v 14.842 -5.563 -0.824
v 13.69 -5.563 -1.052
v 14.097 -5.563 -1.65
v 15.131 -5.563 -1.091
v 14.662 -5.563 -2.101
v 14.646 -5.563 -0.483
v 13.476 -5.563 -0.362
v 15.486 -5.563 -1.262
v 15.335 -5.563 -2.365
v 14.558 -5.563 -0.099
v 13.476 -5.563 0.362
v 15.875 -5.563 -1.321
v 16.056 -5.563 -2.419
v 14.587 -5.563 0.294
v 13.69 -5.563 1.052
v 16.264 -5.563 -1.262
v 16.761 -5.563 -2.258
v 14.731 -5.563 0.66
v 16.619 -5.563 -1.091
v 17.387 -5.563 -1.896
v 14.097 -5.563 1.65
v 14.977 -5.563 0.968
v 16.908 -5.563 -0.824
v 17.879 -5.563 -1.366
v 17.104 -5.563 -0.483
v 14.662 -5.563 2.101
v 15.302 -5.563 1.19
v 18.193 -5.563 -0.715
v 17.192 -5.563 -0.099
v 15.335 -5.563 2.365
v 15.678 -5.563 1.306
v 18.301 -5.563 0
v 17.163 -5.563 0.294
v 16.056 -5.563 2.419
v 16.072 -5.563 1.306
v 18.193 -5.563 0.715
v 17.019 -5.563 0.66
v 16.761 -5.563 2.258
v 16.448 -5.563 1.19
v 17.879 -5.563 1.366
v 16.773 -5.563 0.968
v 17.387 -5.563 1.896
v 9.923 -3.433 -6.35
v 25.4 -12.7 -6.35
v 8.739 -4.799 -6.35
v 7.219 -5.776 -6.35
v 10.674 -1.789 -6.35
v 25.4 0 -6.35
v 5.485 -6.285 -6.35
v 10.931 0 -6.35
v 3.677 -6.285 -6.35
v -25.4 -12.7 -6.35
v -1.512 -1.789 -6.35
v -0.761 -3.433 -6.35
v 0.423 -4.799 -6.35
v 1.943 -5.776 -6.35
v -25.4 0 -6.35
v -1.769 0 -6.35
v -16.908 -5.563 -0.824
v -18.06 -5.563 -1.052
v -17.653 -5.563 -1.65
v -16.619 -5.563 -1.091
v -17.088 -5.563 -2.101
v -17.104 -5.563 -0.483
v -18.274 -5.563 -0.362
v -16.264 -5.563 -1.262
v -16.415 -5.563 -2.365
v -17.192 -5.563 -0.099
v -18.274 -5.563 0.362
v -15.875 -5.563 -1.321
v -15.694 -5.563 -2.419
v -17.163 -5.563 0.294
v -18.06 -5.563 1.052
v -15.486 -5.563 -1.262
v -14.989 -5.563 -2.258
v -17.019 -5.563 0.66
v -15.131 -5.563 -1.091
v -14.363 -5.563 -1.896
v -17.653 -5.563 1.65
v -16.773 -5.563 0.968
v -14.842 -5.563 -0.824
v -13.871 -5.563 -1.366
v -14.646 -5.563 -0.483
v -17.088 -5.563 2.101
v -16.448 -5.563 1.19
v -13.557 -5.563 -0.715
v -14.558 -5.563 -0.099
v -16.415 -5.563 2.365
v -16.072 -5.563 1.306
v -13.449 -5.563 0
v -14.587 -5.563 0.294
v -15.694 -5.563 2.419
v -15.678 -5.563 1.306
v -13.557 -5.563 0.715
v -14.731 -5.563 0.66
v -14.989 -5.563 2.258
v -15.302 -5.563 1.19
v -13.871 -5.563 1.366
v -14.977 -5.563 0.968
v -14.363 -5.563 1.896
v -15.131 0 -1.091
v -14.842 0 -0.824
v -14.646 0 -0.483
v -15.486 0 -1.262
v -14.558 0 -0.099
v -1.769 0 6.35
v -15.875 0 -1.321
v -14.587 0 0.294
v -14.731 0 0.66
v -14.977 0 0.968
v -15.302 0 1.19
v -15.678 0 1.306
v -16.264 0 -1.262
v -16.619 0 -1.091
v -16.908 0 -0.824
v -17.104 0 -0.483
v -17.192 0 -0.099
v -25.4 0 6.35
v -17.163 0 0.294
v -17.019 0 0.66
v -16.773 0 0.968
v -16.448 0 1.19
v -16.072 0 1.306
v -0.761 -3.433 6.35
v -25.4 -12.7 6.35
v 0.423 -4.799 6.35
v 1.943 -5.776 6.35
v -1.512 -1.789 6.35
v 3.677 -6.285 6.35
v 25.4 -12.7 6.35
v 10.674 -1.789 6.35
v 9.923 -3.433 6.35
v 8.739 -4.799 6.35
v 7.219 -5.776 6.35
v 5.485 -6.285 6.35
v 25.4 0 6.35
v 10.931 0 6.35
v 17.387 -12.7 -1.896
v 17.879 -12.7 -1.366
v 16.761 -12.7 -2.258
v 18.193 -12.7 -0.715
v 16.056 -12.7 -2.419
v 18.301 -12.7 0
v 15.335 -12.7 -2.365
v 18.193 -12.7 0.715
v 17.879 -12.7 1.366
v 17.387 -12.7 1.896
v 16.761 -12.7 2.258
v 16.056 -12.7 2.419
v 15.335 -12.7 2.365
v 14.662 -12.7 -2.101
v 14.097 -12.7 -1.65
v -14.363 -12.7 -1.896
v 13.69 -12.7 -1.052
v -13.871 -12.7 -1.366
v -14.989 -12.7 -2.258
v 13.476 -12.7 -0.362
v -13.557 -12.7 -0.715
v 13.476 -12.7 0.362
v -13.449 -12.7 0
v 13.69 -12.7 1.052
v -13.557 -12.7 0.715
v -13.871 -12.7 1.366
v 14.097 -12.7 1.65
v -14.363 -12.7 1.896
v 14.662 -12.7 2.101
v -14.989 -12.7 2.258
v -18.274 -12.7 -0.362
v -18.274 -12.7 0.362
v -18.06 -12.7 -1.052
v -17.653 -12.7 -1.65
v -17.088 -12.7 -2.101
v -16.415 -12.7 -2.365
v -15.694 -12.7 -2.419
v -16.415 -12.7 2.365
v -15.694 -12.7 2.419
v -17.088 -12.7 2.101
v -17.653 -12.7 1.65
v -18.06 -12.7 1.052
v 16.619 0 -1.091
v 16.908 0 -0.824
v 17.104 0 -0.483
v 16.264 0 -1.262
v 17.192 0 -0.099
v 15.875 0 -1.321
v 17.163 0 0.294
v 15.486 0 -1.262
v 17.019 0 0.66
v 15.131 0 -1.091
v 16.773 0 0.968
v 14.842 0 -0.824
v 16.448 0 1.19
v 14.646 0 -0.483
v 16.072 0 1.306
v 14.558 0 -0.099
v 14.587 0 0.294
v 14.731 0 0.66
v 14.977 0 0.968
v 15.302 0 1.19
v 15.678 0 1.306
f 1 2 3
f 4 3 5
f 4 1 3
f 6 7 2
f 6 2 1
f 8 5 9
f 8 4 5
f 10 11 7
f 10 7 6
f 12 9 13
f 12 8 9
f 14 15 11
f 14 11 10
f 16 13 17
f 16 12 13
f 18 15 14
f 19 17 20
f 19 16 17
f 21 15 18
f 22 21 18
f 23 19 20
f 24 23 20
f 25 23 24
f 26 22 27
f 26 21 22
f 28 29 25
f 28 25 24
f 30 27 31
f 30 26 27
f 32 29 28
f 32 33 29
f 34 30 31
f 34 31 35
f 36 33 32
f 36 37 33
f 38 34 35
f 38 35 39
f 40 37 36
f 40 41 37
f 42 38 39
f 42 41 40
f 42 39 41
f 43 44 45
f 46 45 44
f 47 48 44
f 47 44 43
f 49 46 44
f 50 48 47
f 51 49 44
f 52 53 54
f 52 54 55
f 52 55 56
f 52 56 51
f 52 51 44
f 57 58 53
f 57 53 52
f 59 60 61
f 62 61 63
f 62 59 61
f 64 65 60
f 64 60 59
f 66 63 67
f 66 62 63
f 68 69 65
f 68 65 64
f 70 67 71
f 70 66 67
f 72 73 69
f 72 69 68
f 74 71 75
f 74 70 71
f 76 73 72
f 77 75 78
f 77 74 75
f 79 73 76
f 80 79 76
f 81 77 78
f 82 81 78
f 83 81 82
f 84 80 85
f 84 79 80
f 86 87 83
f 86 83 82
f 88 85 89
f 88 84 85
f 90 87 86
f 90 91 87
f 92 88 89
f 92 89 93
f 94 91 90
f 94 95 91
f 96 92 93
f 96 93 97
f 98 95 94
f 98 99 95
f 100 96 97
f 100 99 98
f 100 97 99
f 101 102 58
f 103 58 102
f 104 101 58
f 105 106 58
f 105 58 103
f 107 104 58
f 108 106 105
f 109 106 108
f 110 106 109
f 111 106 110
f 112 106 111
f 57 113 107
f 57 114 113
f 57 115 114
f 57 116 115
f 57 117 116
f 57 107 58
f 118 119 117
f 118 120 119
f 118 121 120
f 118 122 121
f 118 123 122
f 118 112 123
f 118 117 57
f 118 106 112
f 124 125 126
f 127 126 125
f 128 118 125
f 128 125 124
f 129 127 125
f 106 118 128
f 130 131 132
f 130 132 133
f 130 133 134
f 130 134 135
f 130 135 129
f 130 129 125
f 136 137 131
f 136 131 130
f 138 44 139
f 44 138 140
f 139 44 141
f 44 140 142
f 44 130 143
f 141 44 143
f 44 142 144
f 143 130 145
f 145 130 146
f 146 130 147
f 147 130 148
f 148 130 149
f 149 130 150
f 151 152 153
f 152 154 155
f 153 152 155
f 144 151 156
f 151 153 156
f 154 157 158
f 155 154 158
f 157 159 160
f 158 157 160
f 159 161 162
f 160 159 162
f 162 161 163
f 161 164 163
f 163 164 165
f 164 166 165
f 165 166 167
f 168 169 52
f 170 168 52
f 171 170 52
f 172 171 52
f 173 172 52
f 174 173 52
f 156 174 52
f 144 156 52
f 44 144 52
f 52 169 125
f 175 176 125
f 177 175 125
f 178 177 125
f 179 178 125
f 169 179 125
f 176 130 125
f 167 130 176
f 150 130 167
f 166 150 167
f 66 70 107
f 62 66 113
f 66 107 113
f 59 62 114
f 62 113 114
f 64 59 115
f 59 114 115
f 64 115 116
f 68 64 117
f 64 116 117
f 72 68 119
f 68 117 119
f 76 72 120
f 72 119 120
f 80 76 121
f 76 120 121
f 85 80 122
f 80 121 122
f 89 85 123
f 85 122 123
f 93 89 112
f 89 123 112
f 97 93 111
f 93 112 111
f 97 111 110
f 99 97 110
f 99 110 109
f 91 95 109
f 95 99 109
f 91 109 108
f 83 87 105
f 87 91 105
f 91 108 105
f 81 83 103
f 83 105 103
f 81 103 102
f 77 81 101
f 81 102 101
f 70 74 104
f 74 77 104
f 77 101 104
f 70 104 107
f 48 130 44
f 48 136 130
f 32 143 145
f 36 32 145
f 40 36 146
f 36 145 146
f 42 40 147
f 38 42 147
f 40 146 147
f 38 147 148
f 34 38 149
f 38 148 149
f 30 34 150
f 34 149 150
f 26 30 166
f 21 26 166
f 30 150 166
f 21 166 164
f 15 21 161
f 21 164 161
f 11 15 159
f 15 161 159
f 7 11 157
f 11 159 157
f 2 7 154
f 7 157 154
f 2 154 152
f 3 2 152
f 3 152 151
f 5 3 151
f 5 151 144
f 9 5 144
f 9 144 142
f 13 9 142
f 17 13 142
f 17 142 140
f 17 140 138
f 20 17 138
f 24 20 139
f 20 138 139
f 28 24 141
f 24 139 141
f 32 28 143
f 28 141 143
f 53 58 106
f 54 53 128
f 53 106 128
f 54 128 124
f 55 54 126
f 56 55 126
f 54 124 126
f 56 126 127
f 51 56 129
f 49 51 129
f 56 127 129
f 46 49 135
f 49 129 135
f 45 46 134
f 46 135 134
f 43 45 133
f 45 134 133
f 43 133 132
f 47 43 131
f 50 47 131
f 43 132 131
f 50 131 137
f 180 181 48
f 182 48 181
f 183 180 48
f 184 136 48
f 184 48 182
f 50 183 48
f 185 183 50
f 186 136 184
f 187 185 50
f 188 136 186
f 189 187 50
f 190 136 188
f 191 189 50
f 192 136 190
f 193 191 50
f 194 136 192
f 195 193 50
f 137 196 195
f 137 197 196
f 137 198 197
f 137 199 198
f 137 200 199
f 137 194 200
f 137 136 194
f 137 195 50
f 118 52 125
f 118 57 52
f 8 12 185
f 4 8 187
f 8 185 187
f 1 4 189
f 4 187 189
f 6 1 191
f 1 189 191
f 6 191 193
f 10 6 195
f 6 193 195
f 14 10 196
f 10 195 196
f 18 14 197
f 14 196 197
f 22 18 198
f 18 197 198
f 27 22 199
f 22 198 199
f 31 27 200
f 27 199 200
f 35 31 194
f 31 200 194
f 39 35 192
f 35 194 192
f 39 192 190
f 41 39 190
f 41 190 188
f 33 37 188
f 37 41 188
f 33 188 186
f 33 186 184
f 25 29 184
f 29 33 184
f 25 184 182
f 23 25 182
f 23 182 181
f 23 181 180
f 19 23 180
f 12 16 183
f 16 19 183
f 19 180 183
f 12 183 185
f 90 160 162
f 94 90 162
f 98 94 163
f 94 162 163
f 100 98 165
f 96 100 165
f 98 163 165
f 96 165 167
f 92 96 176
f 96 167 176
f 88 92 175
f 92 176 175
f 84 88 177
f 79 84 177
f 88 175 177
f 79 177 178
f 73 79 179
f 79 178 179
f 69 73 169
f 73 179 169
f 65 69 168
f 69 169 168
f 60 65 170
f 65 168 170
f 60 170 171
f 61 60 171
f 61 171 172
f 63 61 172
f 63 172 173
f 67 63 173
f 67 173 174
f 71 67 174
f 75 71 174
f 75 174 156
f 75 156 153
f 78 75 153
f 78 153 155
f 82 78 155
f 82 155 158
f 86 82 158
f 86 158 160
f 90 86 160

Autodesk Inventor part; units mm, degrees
ref_plane "YZ Plane" through (0, 0, 0) normal (1, 0, 0) x (0, 1, 0)
ref_plane "XZ Plane" through (0, 0, 0) normal (0, 1, 0) x (-1, 0, 0)
ref_plane "XY Plane" through (0, 0, 0) normal (0, 0, 1) x (1, 0, 0)
sketch "Sketch1" plane through (0, 0, 0) normal (0, 1, 0) x (-1, 0, 0)
  line L0 (25.4, 6.35) -> (-25.4, 6.35)
  line L1 (-25.4, 6.35) -> (-25.4, -6.35)
  line L2 (-25.4, -6.35) -> (25.4, -6.35)
  line L3 (25.4, -6.35) -> (25.4, 6.35)
  line L4 (25.4, 6.35) -> (-25.4, -6.35) construction
  line L5 (-25.4, 6.35) -> (25.4, -6.35) construction
  point P0 (0, 0)
  dimension "d0" = 50.8
  dimension "d1" = 12.7
extrude "Extrusion1" add sketch "Sketch1" against normal blind 12.7
sketch "Sketch3" plane through (-25.4, 0, 6.35) normal (0, 0, 1) x (1, 0, 0)
  line L0 (0, 0) -> (50.8, 0) projected
  line L1 (0, 0) -> (0, -12.7) projected
  line L2 (50.8, -12.7) -> (0, -12.7) projected
  line L3 (50.8, 0) -> (50.8, -12.7) projected
  circle A0 centre (29.981, 0) radius 6.35 projected
  point P0 (25.4, 0)
extrude "Extrusion2" cut sketch "Sketch3" against normal through all contours A0 L0 | L0 A0
sketch "Sketch4" plane through (0, -12.7, 0) normal (0, -1, 0) x (1, 0, 0)
  line L0 (-25.4, 6.35) -> (-25.4, -6.35) construction
  line L1 (-25.4, 0) -> (25.4, 0) construction
  line L2 (25.4, -6.35) -> (25.4, 6.35) construction
  point P0 (0, 0)
  point P1 (-15.875, 0)
  point P2 (15.875, 0)
  dimension "d6" = 9.525
  dimension "d7" = 9.525
hole "Hole1" at (-15.875, -12.7, 0) at (15.875, -12.7, 0) direction (0, 1, 0) diameter 2.6416 end through all thread size "6-32 UNC" class "2B" standard "ANSI Unified Screw Threads"
sketch "Sketch7" plane through (0, -12.7, 0) normal (0, -1, 0) x (1, 0, 0)
  circle A0 centre (-15.875, 0) radius 1.3208 projected
  circle A1 centre (-15.875, 0) radius 2.4257
  circle A2 centre (15.875, 0) radius 1.3208 projected
  circle A3 centre (15.875, 0) radius 2.4257
  point P0 (0, 0)
  dimension "d18" = 4.8514
extrude "Extrusion4" cut sketch "Sketch7" against normal blind 7.1374
properties part number "HoldWormDrive"
